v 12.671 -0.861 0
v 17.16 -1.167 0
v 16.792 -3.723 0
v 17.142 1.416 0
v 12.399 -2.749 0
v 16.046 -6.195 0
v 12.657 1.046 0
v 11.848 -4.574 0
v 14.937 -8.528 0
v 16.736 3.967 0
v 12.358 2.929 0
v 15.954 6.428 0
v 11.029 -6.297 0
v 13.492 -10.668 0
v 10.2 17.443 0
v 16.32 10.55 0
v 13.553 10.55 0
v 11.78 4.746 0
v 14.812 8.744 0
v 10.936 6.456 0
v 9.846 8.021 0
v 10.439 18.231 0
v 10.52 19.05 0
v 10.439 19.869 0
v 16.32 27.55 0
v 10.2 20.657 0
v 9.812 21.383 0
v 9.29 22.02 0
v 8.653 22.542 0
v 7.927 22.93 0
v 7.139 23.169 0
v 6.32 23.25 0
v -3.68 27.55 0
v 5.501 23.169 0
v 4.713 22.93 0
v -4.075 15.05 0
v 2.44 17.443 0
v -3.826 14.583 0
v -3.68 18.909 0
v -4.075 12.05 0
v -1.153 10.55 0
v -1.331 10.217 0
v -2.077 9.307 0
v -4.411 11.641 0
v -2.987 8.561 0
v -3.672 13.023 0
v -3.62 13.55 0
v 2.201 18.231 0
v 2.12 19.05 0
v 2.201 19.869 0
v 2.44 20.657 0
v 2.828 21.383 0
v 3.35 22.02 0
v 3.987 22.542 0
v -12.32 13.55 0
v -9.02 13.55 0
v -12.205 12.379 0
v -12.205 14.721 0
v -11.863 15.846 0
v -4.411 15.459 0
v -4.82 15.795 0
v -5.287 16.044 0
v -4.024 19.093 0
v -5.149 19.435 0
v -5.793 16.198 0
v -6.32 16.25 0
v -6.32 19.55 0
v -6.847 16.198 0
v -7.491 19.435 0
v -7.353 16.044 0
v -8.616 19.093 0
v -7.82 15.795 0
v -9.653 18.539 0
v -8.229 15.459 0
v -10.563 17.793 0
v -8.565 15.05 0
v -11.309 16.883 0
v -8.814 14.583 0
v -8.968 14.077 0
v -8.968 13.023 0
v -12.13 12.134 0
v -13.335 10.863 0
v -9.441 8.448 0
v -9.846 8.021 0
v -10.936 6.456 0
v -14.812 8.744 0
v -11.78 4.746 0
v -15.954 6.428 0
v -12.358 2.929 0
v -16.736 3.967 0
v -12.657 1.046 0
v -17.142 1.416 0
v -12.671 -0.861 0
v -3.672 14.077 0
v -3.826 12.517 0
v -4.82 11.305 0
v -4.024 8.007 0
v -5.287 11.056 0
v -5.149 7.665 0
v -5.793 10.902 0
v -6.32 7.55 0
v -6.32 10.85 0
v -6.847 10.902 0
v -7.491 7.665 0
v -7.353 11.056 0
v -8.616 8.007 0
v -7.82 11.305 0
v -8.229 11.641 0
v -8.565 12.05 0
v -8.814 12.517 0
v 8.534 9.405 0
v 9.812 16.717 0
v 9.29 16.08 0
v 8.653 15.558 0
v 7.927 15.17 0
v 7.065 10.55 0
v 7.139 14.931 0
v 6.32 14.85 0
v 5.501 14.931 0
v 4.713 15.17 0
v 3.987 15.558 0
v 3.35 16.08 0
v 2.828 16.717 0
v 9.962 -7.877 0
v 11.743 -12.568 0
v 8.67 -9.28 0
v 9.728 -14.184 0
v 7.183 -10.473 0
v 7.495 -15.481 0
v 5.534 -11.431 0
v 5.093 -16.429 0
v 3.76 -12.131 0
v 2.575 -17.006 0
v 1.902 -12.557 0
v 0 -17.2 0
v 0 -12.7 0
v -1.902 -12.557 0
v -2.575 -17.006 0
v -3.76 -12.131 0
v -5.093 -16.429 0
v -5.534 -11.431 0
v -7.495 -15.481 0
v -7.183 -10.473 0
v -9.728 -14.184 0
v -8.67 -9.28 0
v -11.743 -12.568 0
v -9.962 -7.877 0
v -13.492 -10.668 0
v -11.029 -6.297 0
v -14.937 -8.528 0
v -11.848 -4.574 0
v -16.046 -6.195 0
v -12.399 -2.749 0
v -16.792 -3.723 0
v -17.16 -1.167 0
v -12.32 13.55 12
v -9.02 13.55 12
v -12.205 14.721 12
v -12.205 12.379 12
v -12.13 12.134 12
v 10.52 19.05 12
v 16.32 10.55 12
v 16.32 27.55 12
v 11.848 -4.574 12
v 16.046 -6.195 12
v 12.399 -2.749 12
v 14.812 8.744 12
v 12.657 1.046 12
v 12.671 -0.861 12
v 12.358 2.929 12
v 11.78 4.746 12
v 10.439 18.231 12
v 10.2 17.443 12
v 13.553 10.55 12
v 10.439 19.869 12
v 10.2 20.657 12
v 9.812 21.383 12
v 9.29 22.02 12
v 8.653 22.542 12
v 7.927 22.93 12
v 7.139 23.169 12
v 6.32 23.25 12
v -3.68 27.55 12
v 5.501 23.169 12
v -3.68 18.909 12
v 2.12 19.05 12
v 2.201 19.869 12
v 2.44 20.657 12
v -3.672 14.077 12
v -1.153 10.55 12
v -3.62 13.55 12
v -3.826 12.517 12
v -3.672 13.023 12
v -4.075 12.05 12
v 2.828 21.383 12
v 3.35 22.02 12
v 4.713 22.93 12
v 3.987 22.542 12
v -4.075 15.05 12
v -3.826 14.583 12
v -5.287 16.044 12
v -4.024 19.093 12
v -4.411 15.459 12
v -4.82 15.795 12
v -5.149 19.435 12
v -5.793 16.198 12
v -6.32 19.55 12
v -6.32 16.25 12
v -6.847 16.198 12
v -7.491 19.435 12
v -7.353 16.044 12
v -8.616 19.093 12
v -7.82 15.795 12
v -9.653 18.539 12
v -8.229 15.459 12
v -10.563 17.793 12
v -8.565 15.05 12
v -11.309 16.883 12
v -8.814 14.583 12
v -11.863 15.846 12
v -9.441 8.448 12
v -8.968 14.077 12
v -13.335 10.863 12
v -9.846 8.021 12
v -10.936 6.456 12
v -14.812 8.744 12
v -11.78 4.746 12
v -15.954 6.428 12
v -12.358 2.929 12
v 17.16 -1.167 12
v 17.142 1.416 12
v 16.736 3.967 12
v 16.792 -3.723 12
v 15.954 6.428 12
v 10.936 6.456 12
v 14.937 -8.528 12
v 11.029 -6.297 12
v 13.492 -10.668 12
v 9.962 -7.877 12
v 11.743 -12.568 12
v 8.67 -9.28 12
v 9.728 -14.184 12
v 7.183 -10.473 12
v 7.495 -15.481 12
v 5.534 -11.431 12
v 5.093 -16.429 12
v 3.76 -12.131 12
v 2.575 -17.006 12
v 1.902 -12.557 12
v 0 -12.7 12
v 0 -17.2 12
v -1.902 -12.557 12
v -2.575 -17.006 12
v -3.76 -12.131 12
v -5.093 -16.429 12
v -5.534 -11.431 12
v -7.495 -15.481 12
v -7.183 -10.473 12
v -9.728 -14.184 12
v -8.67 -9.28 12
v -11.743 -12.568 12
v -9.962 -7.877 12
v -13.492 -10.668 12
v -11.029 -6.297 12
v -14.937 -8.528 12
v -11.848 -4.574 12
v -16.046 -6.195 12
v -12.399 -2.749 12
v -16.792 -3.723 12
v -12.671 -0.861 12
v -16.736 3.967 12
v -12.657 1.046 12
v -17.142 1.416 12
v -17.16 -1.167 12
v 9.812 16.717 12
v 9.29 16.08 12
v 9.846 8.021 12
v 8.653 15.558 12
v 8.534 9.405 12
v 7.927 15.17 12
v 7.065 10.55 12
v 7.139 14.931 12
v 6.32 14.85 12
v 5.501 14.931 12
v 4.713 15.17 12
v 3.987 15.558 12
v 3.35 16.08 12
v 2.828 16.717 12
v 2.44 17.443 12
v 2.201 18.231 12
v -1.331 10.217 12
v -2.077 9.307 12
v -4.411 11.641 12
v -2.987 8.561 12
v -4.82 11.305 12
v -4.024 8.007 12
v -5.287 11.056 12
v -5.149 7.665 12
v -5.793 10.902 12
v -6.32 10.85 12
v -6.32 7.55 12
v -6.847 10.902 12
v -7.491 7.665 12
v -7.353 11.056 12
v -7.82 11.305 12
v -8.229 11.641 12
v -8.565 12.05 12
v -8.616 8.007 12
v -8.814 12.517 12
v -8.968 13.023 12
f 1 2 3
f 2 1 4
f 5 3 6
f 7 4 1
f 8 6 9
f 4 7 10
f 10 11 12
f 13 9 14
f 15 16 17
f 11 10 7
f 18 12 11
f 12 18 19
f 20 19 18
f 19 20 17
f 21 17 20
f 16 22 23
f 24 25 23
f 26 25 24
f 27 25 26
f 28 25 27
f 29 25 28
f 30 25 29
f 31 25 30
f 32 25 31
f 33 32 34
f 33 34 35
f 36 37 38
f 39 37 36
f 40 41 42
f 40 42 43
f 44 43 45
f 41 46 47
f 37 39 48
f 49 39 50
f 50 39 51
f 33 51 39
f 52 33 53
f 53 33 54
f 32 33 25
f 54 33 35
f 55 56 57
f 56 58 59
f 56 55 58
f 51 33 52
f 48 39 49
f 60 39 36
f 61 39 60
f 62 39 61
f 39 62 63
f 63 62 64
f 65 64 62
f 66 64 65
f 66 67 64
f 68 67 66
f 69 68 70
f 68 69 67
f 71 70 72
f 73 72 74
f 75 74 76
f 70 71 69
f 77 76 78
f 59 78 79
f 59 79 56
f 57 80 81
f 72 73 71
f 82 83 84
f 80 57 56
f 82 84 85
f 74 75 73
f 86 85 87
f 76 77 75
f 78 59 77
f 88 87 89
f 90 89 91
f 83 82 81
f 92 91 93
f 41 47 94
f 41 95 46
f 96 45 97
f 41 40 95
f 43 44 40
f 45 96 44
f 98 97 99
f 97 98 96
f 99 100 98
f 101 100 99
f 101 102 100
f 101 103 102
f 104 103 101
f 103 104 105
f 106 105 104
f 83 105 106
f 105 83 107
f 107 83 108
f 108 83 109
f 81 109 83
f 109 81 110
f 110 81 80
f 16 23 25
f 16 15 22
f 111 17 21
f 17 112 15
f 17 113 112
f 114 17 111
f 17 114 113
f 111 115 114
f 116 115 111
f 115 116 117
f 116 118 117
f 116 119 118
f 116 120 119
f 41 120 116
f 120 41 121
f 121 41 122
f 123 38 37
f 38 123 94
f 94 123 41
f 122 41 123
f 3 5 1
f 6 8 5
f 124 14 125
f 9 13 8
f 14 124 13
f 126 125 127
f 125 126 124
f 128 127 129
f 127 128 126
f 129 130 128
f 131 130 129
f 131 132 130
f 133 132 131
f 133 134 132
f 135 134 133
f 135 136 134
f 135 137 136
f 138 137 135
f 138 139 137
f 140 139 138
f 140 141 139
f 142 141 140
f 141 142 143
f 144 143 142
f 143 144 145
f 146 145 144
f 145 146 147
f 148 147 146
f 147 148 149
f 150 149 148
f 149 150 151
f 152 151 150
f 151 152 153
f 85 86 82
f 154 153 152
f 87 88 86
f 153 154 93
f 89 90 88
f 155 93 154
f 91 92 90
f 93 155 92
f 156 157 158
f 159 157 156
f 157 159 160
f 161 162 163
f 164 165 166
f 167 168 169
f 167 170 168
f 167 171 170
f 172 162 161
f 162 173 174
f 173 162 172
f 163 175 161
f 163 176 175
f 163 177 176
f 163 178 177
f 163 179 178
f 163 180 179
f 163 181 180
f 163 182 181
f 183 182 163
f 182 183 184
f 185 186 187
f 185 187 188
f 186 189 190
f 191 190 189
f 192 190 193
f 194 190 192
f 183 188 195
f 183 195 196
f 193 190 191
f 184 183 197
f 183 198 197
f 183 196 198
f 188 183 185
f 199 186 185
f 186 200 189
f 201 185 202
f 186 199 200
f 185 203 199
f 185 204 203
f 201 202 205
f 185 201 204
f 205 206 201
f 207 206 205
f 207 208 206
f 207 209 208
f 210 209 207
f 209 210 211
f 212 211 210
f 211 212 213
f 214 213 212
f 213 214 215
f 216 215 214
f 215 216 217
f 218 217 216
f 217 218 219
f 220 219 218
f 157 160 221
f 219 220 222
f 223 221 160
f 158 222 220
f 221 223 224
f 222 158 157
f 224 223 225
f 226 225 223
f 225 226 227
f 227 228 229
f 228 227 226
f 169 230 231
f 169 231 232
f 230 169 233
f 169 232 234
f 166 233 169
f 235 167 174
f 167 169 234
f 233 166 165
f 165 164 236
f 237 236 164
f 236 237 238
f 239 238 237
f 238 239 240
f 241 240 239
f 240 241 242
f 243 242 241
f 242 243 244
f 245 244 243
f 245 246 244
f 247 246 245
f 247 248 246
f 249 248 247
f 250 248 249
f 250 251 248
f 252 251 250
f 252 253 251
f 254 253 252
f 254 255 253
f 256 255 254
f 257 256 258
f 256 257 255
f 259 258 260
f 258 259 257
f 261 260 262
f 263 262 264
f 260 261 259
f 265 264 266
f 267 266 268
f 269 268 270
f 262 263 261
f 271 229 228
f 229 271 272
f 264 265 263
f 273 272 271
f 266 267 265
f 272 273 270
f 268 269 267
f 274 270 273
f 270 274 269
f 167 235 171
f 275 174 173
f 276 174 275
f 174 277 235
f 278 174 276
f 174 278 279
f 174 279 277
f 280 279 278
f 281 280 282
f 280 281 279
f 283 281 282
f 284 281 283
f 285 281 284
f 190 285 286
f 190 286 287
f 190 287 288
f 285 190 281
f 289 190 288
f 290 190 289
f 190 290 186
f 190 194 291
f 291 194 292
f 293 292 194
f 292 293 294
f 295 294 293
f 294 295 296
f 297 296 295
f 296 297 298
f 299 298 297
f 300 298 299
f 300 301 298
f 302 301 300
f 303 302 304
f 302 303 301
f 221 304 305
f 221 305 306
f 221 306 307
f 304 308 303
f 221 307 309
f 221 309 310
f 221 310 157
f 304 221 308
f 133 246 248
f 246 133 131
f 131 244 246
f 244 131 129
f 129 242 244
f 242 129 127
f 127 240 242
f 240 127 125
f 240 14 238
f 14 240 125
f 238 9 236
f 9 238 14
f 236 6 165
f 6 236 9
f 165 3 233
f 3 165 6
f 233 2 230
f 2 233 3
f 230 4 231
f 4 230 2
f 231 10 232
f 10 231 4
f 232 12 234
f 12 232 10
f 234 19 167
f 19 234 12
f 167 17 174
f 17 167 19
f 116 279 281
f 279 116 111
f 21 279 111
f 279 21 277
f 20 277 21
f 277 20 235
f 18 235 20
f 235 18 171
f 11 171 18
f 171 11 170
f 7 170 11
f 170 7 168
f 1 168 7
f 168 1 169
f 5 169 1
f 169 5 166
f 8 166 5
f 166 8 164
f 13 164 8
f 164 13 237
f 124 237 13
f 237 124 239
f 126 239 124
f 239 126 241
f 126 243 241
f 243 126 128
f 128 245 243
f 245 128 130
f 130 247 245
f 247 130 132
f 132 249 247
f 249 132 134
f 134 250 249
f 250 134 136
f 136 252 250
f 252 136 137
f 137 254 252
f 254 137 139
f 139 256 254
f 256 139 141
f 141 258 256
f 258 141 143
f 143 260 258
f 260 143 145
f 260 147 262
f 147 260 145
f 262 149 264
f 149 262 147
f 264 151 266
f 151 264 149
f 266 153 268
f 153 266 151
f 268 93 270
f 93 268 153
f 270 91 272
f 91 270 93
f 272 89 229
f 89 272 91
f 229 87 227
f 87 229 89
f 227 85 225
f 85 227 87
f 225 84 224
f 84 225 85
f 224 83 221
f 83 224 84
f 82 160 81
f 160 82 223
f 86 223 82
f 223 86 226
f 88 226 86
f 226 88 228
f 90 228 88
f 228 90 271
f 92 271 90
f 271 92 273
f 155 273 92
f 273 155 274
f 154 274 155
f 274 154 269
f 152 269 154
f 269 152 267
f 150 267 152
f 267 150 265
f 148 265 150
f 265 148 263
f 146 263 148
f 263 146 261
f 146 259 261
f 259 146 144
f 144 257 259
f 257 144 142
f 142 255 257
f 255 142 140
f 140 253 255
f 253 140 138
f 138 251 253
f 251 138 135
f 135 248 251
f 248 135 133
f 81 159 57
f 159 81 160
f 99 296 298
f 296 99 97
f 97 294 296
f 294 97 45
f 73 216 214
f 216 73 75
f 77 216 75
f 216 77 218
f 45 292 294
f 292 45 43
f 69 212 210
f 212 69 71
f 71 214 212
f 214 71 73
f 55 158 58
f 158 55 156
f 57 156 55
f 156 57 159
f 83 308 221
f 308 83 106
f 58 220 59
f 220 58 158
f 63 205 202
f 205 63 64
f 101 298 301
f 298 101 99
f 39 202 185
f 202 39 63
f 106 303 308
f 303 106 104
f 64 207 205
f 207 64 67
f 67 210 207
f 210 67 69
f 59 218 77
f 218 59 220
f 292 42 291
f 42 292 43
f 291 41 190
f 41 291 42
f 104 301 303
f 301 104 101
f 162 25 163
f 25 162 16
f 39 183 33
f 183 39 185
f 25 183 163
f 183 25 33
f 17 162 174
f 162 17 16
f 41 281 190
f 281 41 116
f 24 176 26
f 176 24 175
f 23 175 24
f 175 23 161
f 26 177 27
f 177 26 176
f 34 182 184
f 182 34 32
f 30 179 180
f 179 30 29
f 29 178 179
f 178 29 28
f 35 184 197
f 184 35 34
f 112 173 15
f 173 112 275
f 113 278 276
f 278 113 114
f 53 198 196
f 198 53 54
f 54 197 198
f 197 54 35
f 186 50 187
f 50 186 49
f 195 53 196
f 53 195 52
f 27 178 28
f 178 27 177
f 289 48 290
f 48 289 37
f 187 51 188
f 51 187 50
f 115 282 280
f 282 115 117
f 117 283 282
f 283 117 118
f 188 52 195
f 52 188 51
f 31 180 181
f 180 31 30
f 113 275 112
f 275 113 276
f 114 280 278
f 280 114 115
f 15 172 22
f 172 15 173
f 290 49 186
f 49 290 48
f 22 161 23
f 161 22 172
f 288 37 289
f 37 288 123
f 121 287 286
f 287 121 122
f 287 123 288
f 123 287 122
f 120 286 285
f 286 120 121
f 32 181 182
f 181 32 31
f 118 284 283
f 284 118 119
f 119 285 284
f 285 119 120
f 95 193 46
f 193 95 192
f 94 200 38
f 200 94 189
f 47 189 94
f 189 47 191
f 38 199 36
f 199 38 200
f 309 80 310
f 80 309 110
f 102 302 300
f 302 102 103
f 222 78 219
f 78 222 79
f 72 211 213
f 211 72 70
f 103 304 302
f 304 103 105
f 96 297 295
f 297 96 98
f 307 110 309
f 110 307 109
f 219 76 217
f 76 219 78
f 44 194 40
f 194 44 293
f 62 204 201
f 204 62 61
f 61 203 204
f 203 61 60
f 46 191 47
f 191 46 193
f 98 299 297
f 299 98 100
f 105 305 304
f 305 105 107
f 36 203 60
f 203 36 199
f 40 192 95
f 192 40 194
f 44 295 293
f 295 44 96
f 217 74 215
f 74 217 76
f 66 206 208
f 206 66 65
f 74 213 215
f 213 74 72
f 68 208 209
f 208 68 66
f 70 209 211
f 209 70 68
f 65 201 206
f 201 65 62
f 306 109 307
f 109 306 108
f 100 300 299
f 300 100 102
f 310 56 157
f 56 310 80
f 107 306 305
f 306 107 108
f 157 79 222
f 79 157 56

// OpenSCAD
$fn = 32;

// ----------------------------------------------------------------------
// Pipe clamp: 34.4 mm ring, 4.5 mm wall, 12 mm wide
// ----------------------------------------------------------------------

// --- parameters (mm) ---
outer_r = 17.2;           // clamp outside radius
inner_r = 12.7;           // pipe bore radius
band = 4.5;               // band thickness
clamp_w = 12;             // clamp width
opening = 50;             // opening angle between the ends
lug_w = 20;               // lug width
lug_len = 17;             // lug length
bolt_d = 8.4;             // bolt hole
knuckle_d = 12;           // hinge knuckle diameter
pin_d = 5.4;              // hinge pin hole

clamp_profile = [[-7.269, 15.588], [-9.521, 14.324], [-11.559, 12.737], [-13.335, 10.863], [-14.812, 8.744], [-15.954, 6.428], [-16.736, 3.967], [-17.142, 1.416], [-17.16, -1.167], [-16.792, -3.723], [-16.046, -6.195], [-14.937, -8.528], [-13.492, -10.668], [-11.743, -12.568], [-9.728, -14.184], [-7.495, -15.481], [-5.093, -16.429], [-2.575, -17.006], [0, -17.2], [2.575, -17.006], [5.093, -16.429], [7.495, -15.481], [9.728, -14.184], [11.743, -12.568], [13.492, -10.668], [14.937, -8.528], [16.046, -6.195], [16.792, -3.723], [17.16, -1.167], [17.142, 1.416], [16.736, 3.967], [15.954, 6.428], [14.812, 8.744], [13.335, 10.863], [11.559, 12.737], [9.521, 14.324], [7.269, 15.588], [5.367, 11.51], [7.03, 10.577], [8.534, 9.405], [9.846, 8.021], [10.936, 6.456], [11.78, 4.746], [12.358, 2.929], [12.657, 1.046], [12.671, -0.861], [12.399, -2.749], [11.848, -4.574], [11.029, -6.297], [9.962, -7.877], [8.67, -9.28], [7.183, -10.473], [5.534, -11.431], [3.76, -12.131], [1.902, -12.557], [0, -12.7], [-1.902, -12.557], [-3.76, -12.131], [-5.534, -11.431], [-7.183, -10.473], [-8.67, -9.28], [-9.962, -7.877], [-11.029, -6.297], [-11.848, -4.574], [-12.399, -2.749], [-12.671, -0.861], [-12.657, 1.046], [-12.358, 2.929], [-11.78, 4.746], [-10.936, 6.456], [-9.846, 8.021], [-8.534, 9.405], [-7.03, 10.577], [-5.367, 11.51]];

difference() {
  union() {
    linear_extrude(height = clamp_w) polygon(clamp_profile);
    /* hinge knuckle, sunk 2 mm into the band end */
    translate([-6.32, 13.55, 0]) cylinder(h = clamp_w, d = knuckle_d);
    /* bolt lug on the other end */
    translate([-3.68, 10.55, 0]) cube([lug_w, 17, clamp_w]);
  }
  translate([6.32, 19.05, -2.5]) cylinder(h = clamp_w + 5, d = bolt_d);
  translate([-6.32, 13.55, -2.5]) cylinder(h = clamp_w + 5, d = pin_d);
}
